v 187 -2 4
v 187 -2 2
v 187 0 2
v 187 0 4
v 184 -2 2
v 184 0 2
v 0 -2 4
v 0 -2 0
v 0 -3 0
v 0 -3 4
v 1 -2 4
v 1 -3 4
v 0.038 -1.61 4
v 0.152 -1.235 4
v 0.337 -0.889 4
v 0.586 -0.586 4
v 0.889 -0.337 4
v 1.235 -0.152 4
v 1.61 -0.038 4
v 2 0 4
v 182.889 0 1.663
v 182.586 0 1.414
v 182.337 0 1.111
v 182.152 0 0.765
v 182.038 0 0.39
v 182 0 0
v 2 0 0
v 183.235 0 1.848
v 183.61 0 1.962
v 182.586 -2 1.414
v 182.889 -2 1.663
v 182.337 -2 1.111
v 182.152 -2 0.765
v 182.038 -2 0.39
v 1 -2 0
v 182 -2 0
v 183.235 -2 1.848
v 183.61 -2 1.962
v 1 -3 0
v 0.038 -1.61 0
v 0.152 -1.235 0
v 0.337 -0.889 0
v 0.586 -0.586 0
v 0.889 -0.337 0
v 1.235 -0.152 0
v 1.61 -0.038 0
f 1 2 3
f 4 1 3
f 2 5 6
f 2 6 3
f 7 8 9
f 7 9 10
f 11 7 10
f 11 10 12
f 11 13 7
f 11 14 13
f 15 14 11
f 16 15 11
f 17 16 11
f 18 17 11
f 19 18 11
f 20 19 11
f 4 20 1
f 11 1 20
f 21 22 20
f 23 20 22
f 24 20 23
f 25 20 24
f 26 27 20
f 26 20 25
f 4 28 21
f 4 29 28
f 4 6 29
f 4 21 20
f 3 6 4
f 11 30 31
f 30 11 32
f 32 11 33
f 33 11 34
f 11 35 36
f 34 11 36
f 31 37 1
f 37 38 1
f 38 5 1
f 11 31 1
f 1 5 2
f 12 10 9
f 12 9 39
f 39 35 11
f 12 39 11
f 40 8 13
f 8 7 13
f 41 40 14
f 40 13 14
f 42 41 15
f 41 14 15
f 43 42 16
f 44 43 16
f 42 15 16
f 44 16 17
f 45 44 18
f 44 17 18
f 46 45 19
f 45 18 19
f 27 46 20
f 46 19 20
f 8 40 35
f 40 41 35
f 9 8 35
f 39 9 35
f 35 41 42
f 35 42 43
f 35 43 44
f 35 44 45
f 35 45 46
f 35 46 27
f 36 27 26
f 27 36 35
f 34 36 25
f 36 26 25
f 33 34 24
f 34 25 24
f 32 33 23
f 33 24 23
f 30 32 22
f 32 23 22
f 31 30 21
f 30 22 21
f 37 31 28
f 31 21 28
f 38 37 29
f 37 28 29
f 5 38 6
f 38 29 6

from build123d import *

# Parameters (mm, degrees)
SKETCH_1_W          = 187
SKETCH_1_H          = 2
EXTRUDE_1_DEPTH     = 4
SKETCH_2_W          = 1
SKETCH_2_H          = 4
EXTRUDE_1_2_DEPTH   = 1
FILLET_1_R          = 2
SKETCH_3_W          = 5
SKETCH_3_H          = 2
CUT_EXTRUDE_1_DEPTH = 188.053468292
FILLET_2_R          = 2


with BuildPart() as part:
    # 草图1 → Extrude 1 (new body)
    with BuildSketch(Plane.XY):
        with Locations((93.5, -1)):
            Rectangle(SKETCH_1_W, SKETCH_1_H)
    extrude(amount=EXTRUDE_1_DEPTH)

    # 草图2 → Extrude 1 2 (add)
    with BuildSketch(Plane.XZ.offset(2)):
        with Locations((0.5, 2)):
            Rectangle(SKETCH_2_W, SKETCH_2_H)
    extrude(amount=EXTRUDE_1_2_DEPTH)

    # 圆角1
    fillet_1_edges = [part.edges().sort_by_distance(p)[0] for p in [
        (0, 0, 2),
    ]]
    fillet(fillet_1_edges, radius=FILLET_1_R)

    # 草图3 → 切除-拉伸1 (cut, through all)
    with BuildSketch(Plane.XZ.offset(2)):
        with Locations((184.5, 1)):
            Rectangle(SKETCH_3_W, SKETCH_3_H)
    extrude(amount=-CUT_EXTRUDE_1_DEPTH, mode=Mode.SUBTRACT)

    # 圆角2
    fillet_2_edges = [part.edges().sort_by_distance(p)[0] for p in [
        (182, -1, 2),
    ]]
    fillet(fillet_2_edges, radius=FILLET_2_R - 0.0001)  # a hair under: the kernel refuses the full size


solid = part.part
